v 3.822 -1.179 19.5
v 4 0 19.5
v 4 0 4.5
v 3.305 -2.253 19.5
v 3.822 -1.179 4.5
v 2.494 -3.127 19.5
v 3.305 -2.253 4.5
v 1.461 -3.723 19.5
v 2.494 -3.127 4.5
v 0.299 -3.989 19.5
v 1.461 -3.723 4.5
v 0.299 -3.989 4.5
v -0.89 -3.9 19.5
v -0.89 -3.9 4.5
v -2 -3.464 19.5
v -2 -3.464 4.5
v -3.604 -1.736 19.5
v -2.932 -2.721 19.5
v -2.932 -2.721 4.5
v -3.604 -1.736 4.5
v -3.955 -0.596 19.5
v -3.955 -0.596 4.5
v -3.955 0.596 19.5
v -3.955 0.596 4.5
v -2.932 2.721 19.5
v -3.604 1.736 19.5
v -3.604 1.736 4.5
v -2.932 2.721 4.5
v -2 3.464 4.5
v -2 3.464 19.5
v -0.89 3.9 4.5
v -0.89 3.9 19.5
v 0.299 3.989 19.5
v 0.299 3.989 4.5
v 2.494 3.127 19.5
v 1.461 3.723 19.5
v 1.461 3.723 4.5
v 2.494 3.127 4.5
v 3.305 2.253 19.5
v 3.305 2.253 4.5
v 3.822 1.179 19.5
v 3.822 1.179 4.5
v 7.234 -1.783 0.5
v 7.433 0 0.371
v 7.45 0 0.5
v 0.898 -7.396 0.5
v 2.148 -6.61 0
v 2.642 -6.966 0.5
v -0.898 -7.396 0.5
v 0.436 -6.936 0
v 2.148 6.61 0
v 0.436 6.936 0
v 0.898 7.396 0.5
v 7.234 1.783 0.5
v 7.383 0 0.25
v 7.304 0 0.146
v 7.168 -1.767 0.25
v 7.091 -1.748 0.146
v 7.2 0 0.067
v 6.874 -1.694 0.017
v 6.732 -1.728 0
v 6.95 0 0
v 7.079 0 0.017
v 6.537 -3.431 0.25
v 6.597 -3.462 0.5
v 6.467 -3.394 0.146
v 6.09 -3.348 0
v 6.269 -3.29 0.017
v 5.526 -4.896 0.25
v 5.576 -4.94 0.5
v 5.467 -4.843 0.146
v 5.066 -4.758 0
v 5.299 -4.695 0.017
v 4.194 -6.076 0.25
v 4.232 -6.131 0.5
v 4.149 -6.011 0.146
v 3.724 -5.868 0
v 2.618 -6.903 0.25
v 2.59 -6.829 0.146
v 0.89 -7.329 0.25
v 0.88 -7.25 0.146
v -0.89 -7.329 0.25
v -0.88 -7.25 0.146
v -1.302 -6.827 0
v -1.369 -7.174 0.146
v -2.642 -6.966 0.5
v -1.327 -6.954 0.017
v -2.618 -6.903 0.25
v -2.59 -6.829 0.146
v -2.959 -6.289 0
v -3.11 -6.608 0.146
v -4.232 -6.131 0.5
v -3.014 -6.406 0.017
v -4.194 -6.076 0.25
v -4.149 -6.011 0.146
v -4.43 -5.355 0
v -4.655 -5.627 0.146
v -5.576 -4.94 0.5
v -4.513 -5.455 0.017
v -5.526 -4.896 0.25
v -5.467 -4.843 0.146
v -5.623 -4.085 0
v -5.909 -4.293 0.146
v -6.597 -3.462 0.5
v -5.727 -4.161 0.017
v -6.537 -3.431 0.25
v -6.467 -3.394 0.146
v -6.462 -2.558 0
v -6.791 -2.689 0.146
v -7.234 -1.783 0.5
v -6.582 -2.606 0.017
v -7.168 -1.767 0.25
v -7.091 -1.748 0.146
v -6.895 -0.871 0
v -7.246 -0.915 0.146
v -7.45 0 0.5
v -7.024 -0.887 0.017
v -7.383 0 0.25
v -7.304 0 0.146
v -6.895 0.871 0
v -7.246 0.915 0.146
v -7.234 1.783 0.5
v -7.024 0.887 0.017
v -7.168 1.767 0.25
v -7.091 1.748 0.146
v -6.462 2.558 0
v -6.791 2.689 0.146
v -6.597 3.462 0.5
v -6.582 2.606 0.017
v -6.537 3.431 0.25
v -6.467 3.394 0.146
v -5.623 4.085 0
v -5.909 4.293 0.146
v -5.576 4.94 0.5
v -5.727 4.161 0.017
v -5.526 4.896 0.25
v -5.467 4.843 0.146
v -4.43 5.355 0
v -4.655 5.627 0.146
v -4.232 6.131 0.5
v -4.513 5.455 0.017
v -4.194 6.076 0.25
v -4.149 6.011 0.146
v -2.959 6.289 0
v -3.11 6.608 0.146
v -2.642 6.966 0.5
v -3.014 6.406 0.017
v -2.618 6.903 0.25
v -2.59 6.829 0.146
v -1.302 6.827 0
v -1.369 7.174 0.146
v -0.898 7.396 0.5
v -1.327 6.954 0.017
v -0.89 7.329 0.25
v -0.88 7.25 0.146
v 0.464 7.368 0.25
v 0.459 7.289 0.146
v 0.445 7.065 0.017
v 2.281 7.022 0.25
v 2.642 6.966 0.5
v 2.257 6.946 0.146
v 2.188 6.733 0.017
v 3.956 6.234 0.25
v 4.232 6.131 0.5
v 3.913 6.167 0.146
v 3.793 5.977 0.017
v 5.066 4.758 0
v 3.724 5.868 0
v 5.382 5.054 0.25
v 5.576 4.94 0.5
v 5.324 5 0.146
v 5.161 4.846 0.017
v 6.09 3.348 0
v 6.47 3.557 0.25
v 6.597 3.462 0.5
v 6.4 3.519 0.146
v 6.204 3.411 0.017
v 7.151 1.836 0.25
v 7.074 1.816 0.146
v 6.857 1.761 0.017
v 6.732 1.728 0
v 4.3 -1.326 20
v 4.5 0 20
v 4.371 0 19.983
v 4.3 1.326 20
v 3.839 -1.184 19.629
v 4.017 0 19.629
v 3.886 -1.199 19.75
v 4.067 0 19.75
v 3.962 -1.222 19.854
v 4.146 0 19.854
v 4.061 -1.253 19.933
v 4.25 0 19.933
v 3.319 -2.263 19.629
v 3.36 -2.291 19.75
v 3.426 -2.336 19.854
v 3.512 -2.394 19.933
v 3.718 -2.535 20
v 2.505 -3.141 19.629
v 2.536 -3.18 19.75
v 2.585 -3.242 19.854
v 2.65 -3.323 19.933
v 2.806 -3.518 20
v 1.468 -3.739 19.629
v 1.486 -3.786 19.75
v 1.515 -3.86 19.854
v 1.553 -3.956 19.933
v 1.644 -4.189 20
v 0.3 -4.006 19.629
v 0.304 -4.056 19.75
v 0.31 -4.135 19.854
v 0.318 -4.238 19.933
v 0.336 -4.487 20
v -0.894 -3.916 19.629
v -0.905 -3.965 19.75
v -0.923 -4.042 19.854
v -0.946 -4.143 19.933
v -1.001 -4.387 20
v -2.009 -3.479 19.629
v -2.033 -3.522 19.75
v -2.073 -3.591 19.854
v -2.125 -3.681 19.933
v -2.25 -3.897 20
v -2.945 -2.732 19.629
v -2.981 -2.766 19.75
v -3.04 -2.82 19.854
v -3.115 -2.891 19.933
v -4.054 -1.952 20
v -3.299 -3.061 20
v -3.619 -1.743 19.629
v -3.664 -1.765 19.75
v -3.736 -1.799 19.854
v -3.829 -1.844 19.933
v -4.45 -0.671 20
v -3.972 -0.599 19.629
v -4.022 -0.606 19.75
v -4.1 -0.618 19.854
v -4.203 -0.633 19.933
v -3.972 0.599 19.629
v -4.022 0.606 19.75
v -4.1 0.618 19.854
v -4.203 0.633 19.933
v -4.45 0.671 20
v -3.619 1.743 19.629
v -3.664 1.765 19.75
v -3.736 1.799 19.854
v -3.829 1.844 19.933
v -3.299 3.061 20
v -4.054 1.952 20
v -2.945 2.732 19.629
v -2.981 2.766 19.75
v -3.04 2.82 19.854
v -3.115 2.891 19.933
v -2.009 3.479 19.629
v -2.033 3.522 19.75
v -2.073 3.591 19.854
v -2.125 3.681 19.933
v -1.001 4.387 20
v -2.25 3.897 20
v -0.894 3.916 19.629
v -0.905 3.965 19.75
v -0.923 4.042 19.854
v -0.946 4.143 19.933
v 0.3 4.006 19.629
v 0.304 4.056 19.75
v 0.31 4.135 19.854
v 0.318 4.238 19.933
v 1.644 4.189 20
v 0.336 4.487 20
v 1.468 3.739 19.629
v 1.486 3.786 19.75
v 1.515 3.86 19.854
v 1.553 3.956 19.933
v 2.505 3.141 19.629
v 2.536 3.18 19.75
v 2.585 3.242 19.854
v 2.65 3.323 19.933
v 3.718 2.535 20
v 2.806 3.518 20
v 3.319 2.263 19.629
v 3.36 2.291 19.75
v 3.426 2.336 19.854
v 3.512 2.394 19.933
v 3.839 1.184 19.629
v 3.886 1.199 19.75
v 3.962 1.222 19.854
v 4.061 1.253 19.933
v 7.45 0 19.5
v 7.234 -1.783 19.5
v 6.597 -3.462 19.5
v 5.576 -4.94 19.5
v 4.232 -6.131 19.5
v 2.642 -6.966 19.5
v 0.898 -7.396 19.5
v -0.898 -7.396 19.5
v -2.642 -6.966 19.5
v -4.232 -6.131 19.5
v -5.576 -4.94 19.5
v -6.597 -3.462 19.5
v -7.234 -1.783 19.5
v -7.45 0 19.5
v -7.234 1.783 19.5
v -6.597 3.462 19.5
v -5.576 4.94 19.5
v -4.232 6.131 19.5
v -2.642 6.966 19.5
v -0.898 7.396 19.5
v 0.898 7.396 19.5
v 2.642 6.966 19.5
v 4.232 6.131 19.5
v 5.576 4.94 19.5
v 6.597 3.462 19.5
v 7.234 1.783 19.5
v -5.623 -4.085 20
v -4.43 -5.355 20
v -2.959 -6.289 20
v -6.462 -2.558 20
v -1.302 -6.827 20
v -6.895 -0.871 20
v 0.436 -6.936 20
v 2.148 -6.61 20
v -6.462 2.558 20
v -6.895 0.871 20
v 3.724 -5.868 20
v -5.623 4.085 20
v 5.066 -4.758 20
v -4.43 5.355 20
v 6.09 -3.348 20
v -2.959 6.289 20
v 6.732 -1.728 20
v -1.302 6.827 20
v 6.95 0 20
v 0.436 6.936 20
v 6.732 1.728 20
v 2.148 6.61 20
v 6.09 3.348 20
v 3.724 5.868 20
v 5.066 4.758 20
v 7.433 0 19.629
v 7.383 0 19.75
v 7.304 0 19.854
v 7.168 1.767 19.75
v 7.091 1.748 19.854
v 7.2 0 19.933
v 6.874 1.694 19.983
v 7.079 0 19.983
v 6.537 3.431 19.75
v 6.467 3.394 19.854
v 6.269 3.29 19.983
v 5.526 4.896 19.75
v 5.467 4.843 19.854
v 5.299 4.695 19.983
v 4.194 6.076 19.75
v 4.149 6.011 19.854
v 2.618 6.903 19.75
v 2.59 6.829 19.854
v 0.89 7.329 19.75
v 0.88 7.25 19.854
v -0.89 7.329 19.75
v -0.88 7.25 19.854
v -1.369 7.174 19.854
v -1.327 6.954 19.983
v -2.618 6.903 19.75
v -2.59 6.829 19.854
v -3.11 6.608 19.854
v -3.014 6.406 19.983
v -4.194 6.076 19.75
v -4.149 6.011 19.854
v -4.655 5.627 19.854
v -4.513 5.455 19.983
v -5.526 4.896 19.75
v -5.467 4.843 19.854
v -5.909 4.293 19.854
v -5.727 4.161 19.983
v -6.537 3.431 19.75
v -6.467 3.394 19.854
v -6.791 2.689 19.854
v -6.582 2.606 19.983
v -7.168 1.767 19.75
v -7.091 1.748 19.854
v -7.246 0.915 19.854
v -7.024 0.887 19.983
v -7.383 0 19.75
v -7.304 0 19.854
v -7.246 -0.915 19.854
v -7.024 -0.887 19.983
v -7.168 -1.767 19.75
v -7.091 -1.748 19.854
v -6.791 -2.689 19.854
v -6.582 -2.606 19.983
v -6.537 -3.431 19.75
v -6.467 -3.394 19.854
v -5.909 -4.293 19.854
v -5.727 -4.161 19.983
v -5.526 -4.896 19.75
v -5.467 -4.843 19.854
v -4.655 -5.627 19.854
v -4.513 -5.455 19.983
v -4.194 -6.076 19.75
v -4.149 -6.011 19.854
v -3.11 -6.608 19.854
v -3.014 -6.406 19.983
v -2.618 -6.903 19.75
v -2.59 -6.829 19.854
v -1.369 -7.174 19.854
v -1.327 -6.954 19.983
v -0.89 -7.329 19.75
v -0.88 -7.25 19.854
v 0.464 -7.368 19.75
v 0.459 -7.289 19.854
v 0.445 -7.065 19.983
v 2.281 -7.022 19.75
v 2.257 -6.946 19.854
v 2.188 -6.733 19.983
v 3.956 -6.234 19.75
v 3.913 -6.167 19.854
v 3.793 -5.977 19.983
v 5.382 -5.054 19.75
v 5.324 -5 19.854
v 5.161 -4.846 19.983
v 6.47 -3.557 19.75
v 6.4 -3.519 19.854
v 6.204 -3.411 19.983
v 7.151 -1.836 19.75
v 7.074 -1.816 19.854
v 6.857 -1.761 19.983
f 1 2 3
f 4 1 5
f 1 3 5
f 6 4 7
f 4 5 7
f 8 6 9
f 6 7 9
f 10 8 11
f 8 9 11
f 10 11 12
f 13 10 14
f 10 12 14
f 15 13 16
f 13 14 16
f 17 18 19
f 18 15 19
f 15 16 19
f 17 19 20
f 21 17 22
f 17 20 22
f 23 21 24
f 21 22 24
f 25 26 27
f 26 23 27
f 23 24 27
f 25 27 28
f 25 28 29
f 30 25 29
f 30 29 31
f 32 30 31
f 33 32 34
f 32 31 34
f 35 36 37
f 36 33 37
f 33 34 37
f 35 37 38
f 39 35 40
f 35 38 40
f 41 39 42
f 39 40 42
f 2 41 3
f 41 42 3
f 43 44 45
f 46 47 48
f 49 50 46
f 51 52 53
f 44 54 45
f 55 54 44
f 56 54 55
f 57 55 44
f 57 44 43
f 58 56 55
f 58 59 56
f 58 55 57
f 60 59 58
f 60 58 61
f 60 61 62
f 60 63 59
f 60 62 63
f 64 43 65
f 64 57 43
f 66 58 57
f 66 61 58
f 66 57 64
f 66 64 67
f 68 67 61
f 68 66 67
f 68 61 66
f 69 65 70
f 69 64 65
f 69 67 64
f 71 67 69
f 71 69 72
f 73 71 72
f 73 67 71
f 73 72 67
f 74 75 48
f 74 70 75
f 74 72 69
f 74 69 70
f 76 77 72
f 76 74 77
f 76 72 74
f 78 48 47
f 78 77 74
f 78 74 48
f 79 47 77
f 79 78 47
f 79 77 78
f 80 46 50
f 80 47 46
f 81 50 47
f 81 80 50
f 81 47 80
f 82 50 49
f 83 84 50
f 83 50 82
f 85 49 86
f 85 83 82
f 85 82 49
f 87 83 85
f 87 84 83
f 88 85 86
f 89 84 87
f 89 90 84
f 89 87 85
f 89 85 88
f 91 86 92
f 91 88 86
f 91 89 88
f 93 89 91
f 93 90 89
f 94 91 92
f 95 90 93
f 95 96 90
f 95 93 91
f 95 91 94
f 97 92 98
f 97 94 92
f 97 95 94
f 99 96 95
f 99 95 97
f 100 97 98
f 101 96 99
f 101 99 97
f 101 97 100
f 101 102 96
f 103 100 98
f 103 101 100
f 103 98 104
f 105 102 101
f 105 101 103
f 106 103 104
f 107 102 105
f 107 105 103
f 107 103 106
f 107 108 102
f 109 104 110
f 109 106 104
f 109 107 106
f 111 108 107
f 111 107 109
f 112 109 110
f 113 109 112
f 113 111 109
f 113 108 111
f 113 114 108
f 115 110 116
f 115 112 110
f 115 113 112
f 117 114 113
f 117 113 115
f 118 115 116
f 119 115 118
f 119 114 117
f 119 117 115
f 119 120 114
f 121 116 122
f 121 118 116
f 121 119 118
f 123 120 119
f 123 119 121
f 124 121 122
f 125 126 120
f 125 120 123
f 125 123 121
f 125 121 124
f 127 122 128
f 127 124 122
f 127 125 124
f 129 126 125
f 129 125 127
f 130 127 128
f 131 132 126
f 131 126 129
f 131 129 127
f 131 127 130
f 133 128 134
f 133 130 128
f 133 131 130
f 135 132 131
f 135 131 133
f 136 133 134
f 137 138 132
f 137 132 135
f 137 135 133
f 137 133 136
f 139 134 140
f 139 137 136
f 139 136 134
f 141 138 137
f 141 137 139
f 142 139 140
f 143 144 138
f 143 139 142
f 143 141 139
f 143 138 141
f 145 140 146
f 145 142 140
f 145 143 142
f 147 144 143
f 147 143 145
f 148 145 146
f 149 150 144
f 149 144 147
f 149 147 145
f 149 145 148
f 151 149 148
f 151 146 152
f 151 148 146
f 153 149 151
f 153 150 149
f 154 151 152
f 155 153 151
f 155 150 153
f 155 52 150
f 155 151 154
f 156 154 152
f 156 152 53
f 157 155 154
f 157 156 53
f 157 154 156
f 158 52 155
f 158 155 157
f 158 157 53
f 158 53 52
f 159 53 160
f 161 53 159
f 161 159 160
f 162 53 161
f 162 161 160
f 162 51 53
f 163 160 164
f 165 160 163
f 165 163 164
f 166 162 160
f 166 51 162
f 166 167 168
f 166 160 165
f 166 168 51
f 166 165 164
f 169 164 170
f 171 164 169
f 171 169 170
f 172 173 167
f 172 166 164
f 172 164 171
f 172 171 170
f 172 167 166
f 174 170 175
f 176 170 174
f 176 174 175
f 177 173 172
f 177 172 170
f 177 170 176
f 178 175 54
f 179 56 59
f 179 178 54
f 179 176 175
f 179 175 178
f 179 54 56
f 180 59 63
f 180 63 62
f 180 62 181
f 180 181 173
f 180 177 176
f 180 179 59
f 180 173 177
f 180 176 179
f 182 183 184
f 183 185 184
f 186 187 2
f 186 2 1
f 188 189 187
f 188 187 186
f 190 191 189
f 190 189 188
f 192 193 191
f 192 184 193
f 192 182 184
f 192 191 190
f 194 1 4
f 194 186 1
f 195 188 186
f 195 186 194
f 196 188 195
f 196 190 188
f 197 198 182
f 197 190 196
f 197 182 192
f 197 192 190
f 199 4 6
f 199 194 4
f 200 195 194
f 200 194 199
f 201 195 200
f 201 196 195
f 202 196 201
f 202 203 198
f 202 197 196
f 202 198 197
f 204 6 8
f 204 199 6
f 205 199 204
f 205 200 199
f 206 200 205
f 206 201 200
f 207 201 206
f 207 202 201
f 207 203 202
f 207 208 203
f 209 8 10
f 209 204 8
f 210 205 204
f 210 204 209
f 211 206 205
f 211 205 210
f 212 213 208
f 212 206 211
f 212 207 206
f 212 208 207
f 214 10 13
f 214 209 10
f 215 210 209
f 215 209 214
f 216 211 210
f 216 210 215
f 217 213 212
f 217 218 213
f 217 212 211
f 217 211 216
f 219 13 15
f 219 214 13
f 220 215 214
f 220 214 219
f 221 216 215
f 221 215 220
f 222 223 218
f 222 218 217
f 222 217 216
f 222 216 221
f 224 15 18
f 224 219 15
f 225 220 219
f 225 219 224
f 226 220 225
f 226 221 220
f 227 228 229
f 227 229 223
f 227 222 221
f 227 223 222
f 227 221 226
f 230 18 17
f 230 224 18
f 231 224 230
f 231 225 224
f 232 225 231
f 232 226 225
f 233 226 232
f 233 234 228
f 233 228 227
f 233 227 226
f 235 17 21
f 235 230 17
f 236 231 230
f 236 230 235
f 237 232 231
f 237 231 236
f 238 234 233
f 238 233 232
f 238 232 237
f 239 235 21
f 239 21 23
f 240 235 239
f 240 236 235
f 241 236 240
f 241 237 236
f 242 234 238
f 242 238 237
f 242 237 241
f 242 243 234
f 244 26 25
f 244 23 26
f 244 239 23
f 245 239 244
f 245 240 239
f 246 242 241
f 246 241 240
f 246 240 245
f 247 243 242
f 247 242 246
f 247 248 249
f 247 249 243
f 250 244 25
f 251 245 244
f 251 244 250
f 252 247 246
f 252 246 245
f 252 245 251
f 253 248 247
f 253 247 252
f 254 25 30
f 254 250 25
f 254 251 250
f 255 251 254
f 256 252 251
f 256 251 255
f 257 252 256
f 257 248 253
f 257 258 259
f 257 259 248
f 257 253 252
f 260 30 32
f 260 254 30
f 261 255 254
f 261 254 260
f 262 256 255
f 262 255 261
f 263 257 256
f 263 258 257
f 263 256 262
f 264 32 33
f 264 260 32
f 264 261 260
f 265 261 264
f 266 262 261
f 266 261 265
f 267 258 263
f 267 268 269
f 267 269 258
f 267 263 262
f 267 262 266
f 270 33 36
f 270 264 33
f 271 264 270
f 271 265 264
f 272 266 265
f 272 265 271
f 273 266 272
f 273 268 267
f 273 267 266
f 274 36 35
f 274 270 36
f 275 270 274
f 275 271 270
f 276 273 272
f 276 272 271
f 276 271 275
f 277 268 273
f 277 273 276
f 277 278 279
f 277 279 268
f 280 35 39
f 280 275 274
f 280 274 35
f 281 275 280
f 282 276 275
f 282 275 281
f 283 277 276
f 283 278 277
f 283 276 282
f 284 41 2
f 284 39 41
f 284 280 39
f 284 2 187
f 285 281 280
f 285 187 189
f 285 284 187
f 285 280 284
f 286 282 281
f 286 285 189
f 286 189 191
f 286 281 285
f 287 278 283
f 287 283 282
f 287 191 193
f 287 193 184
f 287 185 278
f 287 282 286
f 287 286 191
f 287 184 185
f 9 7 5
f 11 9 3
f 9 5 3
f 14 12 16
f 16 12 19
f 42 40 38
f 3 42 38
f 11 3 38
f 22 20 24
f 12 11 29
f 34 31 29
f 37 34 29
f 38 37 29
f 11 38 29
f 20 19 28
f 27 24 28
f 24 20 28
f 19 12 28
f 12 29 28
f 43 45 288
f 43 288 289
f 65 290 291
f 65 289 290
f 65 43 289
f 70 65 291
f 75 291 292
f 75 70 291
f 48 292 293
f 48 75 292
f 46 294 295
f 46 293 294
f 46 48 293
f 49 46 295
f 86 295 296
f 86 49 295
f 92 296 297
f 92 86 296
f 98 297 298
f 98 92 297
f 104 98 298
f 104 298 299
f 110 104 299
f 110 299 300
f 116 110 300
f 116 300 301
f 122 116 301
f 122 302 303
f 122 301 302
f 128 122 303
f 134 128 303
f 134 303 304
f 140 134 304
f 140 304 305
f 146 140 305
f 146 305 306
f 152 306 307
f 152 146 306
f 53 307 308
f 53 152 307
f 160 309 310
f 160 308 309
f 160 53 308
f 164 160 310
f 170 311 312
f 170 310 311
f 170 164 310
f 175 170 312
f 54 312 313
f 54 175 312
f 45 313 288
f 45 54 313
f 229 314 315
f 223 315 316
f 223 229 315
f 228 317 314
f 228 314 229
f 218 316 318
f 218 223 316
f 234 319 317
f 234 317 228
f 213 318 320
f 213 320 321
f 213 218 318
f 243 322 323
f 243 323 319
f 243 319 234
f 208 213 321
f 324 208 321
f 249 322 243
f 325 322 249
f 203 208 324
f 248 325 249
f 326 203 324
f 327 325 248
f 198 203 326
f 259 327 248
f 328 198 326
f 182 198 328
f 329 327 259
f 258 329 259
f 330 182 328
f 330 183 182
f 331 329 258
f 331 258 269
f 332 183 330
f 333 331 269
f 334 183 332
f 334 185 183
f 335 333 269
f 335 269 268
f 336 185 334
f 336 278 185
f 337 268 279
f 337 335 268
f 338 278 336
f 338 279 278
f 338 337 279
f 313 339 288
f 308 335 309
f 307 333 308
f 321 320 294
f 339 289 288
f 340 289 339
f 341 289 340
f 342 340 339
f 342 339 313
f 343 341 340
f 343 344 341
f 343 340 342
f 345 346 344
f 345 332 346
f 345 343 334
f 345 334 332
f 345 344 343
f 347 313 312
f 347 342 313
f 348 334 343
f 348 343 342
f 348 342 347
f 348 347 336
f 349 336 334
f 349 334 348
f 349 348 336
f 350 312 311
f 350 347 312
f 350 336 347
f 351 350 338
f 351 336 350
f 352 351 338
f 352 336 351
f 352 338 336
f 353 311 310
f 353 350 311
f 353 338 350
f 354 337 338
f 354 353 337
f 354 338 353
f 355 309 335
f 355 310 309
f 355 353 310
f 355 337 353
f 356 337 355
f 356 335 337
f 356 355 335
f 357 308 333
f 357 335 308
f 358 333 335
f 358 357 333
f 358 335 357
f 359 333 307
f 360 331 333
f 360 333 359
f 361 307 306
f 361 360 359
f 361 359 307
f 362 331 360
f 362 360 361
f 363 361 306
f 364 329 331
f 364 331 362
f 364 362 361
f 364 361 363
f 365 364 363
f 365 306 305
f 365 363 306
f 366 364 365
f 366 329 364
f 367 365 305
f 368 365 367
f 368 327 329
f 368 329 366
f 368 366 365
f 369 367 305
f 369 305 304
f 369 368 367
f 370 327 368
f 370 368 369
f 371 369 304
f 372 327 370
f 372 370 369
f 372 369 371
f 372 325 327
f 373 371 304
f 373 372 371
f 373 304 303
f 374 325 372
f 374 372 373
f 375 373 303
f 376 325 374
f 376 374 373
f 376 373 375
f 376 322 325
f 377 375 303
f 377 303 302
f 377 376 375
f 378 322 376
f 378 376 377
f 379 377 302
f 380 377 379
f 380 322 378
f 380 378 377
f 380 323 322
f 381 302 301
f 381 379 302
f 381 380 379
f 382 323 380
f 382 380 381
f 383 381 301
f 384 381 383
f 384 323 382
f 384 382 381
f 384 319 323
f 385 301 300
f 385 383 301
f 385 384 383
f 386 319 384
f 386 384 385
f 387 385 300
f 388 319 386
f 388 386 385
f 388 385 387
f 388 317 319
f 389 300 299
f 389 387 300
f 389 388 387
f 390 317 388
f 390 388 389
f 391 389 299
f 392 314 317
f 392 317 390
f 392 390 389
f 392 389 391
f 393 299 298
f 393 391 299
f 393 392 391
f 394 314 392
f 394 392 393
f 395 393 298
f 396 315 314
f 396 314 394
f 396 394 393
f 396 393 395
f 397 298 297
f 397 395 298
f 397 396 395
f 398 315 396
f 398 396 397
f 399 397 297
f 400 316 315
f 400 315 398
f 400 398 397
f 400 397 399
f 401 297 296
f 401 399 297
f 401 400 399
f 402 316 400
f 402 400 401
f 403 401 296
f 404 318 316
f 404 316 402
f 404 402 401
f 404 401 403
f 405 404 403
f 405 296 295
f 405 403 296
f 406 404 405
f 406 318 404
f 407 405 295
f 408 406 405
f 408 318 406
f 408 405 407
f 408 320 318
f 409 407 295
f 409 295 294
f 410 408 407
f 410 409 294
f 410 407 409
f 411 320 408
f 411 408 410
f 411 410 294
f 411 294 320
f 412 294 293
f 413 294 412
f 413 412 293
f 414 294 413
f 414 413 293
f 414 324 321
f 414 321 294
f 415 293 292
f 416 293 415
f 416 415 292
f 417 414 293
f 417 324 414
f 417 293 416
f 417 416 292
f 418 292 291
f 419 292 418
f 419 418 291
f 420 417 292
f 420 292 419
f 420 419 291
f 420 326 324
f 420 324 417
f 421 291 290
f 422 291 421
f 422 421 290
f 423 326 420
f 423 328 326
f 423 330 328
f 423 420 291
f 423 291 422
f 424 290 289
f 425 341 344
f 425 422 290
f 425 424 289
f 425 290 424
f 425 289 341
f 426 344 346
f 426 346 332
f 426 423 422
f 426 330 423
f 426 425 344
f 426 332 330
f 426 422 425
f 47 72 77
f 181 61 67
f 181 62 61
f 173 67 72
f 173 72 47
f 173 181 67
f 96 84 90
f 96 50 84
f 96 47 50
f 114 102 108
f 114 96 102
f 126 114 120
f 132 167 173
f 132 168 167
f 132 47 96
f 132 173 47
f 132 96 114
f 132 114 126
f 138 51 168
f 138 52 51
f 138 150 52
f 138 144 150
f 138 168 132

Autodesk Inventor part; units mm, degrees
ref_plane "YZ Plane" through (0, 0, 0) normal (1, 0, 0) x (0, 1, 0)
ref_plane "XZ Plane" through (0, 0, 0) normal (0, 1, 0) x (-1, 0, 0)
ref_plane "XY Plane" through (0, 0, 0) normal (0, 0, 1) x (1, 0, 0)
sketch "Sketch1" plane through (0, 0, 0) normal (0, 0, 1) x (1, 0, 0)
  circle A0 centre (0, 0) radius 7.45
  circle A1 centre (0, 0) radius 4
  dimension "d0" = 14.9
  dimension "d3" = 8
extrude "Extrusion2" add sketch "Sketch1" along normal blind 20
fillet "Fillet1" radius 0.5 3 edges at (-7.45, 0, 0) (-7.45, 0, 20) (-4, 0, 20)
sketch "Sketch2" plane through (0, 0, 0) normal (0, 0, -1) x (-1, 0, 0)
  circle A0 centre (0, 0) radius 4 projected
  circle A1 centre (0, 0) radius 6.95 projected
  circle A2 centre (0, 0) radius 4
extrude "Extrusion3" add sketch "Sketch2" against normal blind 4.5 contours A0
properties part number "V5 Z Spacer"
